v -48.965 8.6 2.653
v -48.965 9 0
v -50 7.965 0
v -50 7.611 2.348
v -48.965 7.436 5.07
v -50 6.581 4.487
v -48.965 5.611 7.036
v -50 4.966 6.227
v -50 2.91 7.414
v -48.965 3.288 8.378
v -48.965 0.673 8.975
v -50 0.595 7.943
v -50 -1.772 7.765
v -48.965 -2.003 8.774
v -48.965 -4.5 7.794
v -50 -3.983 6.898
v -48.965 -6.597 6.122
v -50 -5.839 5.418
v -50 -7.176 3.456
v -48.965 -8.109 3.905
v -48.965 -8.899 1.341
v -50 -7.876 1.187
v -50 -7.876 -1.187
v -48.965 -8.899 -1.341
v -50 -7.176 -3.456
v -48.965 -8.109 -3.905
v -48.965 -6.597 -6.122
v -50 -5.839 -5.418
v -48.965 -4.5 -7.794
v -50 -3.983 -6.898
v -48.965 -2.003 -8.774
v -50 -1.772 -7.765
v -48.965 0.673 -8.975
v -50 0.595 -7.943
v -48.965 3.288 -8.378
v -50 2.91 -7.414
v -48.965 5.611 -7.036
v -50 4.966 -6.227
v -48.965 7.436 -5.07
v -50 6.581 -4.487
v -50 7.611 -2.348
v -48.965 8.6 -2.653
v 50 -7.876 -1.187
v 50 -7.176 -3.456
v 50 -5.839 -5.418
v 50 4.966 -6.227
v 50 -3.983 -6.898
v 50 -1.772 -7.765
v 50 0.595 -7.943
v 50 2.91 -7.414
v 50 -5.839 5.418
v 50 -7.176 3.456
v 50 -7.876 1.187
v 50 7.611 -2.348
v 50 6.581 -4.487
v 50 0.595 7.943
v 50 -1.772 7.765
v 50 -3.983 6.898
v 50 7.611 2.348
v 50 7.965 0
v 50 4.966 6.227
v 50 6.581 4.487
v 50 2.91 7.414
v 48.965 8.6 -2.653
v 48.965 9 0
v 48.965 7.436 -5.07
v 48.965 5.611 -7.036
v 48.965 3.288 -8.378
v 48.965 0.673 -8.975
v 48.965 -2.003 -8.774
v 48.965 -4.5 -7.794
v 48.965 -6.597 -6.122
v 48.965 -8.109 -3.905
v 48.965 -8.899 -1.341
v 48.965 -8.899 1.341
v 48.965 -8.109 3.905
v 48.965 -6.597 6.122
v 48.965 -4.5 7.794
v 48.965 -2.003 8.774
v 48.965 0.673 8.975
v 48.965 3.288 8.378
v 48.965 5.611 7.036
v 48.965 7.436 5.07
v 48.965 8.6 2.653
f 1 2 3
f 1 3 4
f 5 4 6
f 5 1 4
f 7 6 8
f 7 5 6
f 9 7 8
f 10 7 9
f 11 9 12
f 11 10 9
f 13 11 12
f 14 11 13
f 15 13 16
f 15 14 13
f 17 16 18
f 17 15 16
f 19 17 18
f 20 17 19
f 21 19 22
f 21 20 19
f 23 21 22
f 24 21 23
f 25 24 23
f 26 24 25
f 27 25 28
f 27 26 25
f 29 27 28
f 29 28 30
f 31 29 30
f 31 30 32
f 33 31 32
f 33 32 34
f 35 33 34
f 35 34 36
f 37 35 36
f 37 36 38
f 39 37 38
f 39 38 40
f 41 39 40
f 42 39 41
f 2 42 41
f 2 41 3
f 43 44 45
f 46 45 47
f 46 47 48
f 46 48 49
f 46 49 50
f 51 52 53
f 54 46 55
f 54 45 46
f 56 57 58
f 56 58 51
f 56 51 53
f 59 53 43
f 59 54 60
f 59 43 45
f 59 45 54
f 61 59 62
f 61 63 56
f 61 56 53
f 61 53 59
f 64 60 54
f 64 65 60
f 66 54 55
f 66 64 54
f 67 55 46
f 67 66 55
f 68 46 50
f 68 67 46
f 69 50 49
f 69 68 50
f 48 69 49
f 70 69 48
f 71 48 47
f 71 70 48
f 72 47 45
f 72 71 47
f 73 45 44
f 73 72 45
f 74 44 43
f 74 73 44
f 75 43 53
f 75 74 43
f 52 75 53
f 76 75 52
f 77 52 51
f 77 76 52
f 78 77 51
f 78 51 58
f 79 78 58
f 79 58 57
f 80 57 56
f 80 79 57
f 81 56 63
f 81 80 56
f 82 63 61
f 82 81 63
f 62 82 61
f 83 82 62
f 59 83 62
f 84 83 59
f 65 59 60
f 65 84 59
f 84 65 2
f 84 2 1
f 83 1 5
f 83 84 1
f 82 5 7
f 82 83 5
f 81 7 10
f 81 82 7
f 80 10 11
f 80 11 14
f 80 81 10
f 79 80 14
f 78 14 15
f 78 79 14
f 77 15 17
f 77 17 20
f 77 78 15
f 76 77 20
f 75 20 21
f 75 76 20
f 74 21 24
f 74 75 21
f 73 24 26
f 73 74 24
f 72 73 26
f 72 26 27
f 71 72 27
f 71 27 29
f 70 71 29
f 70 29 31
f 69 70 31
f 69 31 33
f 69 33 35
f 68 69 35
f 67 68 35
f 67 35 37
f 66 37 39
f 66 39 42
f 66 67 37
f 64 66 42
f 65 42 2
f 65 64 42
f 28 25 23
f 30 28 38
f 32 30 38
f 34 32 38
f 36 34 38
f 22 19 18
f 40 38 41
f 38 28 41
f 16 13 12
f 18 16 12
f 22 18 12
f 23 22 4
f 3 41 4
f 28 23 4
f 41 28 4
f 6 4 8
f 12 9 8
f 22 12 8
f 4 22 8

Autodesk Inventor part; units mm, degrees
ref_plane "YZ Plane" through (0, 0, 0) normal (1, 0, 0) x (0, 1, 0)
ref_plane "XZ Plane" through (0, 0, 0) normal (0, 1, 0) x (-1, 0, 0)
sketch "Sketch1" plane through (0, 0, 0) normal (0, 0, 1) x (1, 0, 0)
  line L0 (50, 9) -> (50, 0)
  line L1 (-50, 0) -> (50, 0)
  line L2 (-70, 0) -> (70, 0) projected
  line L3 (0, 10.8) -> (0, -1.8) projected
  line L4 (-50, 9) -> (-50, 0)
  line L5 (0, 9) -> (0, 0) construction
  line L6 (-70, 0) -> (70, 0) projected
  line L7 (-50, 9) -> (50, 9)
  dimension "d13" = 18
  dimension "d87" = 100
  dimension "d88" = 50
revolve "Body" add sketch "Sketch1" angle 360 about axis through (-50, 0, 0) along (1, 0, 0)
thread "Thread1" size "M18x1.5" class "6g" standard "ISO Metric profile" length 100
chamfer "Chamfer1" distance 1.035 angle 45 1 edges at (50, -9, 0) measured on face at (-16.6667, 8.8835, -1.4437)
chamfer "Chamfer2" distance 1.035 angle 45 1 edges at (-50, -9, 0) measured on face at (15.9767, 8.9708, -0.7242)
ref_plane "Work Plane1" through (2.75, 0, 0) normal (0, -1, 0) x (1, 0, 0)
equation "\"d13\" = NND"
equation "\"d87\" = NLG"
equation "\"d88\" = 0.5 * NLG"
equation "\"d1\" = GEL"
equation "\"d9\" = -0.5 * SPD + 0.5 * NND"
equation "\"d10\" = -0.5 * SPD + 0.5 * NND"
equation "\"d11\" = -0.5 * SPD + 0.5 * NND"
equation "\"d12\" = -0.5 * SPD + 0.5 * NND"
equation "\"NLG\" = 100"
equation "\"GEL\" = NLG"
equation "\"GAL\" = 0.61345 * PTC"
equation "\"SPD\" = 15.93"
equation "\"d0\" = NND"
equation "\"GUL\" = 0.61345 * PTC"
equation "\"NND\" = 18"
equation "\"GUL1\" = GUL"
equation "\"GAL1\" = GAL"
equation "\"d80\" = -GUL - GEL"
equation "\"d86\" = -GEL + GUL1"
equation "\"PTC\" = 1.5"
equation "\"THREADDIA\" = 18"
equation "\"TOA\" = 30deg"
equation "\"GD1\" = THREADDIA - 1.2269 * PTC"
properties part number "DIN 976-1 - M18 x 1.5 x 100 - B" material "Steel, Mild"
